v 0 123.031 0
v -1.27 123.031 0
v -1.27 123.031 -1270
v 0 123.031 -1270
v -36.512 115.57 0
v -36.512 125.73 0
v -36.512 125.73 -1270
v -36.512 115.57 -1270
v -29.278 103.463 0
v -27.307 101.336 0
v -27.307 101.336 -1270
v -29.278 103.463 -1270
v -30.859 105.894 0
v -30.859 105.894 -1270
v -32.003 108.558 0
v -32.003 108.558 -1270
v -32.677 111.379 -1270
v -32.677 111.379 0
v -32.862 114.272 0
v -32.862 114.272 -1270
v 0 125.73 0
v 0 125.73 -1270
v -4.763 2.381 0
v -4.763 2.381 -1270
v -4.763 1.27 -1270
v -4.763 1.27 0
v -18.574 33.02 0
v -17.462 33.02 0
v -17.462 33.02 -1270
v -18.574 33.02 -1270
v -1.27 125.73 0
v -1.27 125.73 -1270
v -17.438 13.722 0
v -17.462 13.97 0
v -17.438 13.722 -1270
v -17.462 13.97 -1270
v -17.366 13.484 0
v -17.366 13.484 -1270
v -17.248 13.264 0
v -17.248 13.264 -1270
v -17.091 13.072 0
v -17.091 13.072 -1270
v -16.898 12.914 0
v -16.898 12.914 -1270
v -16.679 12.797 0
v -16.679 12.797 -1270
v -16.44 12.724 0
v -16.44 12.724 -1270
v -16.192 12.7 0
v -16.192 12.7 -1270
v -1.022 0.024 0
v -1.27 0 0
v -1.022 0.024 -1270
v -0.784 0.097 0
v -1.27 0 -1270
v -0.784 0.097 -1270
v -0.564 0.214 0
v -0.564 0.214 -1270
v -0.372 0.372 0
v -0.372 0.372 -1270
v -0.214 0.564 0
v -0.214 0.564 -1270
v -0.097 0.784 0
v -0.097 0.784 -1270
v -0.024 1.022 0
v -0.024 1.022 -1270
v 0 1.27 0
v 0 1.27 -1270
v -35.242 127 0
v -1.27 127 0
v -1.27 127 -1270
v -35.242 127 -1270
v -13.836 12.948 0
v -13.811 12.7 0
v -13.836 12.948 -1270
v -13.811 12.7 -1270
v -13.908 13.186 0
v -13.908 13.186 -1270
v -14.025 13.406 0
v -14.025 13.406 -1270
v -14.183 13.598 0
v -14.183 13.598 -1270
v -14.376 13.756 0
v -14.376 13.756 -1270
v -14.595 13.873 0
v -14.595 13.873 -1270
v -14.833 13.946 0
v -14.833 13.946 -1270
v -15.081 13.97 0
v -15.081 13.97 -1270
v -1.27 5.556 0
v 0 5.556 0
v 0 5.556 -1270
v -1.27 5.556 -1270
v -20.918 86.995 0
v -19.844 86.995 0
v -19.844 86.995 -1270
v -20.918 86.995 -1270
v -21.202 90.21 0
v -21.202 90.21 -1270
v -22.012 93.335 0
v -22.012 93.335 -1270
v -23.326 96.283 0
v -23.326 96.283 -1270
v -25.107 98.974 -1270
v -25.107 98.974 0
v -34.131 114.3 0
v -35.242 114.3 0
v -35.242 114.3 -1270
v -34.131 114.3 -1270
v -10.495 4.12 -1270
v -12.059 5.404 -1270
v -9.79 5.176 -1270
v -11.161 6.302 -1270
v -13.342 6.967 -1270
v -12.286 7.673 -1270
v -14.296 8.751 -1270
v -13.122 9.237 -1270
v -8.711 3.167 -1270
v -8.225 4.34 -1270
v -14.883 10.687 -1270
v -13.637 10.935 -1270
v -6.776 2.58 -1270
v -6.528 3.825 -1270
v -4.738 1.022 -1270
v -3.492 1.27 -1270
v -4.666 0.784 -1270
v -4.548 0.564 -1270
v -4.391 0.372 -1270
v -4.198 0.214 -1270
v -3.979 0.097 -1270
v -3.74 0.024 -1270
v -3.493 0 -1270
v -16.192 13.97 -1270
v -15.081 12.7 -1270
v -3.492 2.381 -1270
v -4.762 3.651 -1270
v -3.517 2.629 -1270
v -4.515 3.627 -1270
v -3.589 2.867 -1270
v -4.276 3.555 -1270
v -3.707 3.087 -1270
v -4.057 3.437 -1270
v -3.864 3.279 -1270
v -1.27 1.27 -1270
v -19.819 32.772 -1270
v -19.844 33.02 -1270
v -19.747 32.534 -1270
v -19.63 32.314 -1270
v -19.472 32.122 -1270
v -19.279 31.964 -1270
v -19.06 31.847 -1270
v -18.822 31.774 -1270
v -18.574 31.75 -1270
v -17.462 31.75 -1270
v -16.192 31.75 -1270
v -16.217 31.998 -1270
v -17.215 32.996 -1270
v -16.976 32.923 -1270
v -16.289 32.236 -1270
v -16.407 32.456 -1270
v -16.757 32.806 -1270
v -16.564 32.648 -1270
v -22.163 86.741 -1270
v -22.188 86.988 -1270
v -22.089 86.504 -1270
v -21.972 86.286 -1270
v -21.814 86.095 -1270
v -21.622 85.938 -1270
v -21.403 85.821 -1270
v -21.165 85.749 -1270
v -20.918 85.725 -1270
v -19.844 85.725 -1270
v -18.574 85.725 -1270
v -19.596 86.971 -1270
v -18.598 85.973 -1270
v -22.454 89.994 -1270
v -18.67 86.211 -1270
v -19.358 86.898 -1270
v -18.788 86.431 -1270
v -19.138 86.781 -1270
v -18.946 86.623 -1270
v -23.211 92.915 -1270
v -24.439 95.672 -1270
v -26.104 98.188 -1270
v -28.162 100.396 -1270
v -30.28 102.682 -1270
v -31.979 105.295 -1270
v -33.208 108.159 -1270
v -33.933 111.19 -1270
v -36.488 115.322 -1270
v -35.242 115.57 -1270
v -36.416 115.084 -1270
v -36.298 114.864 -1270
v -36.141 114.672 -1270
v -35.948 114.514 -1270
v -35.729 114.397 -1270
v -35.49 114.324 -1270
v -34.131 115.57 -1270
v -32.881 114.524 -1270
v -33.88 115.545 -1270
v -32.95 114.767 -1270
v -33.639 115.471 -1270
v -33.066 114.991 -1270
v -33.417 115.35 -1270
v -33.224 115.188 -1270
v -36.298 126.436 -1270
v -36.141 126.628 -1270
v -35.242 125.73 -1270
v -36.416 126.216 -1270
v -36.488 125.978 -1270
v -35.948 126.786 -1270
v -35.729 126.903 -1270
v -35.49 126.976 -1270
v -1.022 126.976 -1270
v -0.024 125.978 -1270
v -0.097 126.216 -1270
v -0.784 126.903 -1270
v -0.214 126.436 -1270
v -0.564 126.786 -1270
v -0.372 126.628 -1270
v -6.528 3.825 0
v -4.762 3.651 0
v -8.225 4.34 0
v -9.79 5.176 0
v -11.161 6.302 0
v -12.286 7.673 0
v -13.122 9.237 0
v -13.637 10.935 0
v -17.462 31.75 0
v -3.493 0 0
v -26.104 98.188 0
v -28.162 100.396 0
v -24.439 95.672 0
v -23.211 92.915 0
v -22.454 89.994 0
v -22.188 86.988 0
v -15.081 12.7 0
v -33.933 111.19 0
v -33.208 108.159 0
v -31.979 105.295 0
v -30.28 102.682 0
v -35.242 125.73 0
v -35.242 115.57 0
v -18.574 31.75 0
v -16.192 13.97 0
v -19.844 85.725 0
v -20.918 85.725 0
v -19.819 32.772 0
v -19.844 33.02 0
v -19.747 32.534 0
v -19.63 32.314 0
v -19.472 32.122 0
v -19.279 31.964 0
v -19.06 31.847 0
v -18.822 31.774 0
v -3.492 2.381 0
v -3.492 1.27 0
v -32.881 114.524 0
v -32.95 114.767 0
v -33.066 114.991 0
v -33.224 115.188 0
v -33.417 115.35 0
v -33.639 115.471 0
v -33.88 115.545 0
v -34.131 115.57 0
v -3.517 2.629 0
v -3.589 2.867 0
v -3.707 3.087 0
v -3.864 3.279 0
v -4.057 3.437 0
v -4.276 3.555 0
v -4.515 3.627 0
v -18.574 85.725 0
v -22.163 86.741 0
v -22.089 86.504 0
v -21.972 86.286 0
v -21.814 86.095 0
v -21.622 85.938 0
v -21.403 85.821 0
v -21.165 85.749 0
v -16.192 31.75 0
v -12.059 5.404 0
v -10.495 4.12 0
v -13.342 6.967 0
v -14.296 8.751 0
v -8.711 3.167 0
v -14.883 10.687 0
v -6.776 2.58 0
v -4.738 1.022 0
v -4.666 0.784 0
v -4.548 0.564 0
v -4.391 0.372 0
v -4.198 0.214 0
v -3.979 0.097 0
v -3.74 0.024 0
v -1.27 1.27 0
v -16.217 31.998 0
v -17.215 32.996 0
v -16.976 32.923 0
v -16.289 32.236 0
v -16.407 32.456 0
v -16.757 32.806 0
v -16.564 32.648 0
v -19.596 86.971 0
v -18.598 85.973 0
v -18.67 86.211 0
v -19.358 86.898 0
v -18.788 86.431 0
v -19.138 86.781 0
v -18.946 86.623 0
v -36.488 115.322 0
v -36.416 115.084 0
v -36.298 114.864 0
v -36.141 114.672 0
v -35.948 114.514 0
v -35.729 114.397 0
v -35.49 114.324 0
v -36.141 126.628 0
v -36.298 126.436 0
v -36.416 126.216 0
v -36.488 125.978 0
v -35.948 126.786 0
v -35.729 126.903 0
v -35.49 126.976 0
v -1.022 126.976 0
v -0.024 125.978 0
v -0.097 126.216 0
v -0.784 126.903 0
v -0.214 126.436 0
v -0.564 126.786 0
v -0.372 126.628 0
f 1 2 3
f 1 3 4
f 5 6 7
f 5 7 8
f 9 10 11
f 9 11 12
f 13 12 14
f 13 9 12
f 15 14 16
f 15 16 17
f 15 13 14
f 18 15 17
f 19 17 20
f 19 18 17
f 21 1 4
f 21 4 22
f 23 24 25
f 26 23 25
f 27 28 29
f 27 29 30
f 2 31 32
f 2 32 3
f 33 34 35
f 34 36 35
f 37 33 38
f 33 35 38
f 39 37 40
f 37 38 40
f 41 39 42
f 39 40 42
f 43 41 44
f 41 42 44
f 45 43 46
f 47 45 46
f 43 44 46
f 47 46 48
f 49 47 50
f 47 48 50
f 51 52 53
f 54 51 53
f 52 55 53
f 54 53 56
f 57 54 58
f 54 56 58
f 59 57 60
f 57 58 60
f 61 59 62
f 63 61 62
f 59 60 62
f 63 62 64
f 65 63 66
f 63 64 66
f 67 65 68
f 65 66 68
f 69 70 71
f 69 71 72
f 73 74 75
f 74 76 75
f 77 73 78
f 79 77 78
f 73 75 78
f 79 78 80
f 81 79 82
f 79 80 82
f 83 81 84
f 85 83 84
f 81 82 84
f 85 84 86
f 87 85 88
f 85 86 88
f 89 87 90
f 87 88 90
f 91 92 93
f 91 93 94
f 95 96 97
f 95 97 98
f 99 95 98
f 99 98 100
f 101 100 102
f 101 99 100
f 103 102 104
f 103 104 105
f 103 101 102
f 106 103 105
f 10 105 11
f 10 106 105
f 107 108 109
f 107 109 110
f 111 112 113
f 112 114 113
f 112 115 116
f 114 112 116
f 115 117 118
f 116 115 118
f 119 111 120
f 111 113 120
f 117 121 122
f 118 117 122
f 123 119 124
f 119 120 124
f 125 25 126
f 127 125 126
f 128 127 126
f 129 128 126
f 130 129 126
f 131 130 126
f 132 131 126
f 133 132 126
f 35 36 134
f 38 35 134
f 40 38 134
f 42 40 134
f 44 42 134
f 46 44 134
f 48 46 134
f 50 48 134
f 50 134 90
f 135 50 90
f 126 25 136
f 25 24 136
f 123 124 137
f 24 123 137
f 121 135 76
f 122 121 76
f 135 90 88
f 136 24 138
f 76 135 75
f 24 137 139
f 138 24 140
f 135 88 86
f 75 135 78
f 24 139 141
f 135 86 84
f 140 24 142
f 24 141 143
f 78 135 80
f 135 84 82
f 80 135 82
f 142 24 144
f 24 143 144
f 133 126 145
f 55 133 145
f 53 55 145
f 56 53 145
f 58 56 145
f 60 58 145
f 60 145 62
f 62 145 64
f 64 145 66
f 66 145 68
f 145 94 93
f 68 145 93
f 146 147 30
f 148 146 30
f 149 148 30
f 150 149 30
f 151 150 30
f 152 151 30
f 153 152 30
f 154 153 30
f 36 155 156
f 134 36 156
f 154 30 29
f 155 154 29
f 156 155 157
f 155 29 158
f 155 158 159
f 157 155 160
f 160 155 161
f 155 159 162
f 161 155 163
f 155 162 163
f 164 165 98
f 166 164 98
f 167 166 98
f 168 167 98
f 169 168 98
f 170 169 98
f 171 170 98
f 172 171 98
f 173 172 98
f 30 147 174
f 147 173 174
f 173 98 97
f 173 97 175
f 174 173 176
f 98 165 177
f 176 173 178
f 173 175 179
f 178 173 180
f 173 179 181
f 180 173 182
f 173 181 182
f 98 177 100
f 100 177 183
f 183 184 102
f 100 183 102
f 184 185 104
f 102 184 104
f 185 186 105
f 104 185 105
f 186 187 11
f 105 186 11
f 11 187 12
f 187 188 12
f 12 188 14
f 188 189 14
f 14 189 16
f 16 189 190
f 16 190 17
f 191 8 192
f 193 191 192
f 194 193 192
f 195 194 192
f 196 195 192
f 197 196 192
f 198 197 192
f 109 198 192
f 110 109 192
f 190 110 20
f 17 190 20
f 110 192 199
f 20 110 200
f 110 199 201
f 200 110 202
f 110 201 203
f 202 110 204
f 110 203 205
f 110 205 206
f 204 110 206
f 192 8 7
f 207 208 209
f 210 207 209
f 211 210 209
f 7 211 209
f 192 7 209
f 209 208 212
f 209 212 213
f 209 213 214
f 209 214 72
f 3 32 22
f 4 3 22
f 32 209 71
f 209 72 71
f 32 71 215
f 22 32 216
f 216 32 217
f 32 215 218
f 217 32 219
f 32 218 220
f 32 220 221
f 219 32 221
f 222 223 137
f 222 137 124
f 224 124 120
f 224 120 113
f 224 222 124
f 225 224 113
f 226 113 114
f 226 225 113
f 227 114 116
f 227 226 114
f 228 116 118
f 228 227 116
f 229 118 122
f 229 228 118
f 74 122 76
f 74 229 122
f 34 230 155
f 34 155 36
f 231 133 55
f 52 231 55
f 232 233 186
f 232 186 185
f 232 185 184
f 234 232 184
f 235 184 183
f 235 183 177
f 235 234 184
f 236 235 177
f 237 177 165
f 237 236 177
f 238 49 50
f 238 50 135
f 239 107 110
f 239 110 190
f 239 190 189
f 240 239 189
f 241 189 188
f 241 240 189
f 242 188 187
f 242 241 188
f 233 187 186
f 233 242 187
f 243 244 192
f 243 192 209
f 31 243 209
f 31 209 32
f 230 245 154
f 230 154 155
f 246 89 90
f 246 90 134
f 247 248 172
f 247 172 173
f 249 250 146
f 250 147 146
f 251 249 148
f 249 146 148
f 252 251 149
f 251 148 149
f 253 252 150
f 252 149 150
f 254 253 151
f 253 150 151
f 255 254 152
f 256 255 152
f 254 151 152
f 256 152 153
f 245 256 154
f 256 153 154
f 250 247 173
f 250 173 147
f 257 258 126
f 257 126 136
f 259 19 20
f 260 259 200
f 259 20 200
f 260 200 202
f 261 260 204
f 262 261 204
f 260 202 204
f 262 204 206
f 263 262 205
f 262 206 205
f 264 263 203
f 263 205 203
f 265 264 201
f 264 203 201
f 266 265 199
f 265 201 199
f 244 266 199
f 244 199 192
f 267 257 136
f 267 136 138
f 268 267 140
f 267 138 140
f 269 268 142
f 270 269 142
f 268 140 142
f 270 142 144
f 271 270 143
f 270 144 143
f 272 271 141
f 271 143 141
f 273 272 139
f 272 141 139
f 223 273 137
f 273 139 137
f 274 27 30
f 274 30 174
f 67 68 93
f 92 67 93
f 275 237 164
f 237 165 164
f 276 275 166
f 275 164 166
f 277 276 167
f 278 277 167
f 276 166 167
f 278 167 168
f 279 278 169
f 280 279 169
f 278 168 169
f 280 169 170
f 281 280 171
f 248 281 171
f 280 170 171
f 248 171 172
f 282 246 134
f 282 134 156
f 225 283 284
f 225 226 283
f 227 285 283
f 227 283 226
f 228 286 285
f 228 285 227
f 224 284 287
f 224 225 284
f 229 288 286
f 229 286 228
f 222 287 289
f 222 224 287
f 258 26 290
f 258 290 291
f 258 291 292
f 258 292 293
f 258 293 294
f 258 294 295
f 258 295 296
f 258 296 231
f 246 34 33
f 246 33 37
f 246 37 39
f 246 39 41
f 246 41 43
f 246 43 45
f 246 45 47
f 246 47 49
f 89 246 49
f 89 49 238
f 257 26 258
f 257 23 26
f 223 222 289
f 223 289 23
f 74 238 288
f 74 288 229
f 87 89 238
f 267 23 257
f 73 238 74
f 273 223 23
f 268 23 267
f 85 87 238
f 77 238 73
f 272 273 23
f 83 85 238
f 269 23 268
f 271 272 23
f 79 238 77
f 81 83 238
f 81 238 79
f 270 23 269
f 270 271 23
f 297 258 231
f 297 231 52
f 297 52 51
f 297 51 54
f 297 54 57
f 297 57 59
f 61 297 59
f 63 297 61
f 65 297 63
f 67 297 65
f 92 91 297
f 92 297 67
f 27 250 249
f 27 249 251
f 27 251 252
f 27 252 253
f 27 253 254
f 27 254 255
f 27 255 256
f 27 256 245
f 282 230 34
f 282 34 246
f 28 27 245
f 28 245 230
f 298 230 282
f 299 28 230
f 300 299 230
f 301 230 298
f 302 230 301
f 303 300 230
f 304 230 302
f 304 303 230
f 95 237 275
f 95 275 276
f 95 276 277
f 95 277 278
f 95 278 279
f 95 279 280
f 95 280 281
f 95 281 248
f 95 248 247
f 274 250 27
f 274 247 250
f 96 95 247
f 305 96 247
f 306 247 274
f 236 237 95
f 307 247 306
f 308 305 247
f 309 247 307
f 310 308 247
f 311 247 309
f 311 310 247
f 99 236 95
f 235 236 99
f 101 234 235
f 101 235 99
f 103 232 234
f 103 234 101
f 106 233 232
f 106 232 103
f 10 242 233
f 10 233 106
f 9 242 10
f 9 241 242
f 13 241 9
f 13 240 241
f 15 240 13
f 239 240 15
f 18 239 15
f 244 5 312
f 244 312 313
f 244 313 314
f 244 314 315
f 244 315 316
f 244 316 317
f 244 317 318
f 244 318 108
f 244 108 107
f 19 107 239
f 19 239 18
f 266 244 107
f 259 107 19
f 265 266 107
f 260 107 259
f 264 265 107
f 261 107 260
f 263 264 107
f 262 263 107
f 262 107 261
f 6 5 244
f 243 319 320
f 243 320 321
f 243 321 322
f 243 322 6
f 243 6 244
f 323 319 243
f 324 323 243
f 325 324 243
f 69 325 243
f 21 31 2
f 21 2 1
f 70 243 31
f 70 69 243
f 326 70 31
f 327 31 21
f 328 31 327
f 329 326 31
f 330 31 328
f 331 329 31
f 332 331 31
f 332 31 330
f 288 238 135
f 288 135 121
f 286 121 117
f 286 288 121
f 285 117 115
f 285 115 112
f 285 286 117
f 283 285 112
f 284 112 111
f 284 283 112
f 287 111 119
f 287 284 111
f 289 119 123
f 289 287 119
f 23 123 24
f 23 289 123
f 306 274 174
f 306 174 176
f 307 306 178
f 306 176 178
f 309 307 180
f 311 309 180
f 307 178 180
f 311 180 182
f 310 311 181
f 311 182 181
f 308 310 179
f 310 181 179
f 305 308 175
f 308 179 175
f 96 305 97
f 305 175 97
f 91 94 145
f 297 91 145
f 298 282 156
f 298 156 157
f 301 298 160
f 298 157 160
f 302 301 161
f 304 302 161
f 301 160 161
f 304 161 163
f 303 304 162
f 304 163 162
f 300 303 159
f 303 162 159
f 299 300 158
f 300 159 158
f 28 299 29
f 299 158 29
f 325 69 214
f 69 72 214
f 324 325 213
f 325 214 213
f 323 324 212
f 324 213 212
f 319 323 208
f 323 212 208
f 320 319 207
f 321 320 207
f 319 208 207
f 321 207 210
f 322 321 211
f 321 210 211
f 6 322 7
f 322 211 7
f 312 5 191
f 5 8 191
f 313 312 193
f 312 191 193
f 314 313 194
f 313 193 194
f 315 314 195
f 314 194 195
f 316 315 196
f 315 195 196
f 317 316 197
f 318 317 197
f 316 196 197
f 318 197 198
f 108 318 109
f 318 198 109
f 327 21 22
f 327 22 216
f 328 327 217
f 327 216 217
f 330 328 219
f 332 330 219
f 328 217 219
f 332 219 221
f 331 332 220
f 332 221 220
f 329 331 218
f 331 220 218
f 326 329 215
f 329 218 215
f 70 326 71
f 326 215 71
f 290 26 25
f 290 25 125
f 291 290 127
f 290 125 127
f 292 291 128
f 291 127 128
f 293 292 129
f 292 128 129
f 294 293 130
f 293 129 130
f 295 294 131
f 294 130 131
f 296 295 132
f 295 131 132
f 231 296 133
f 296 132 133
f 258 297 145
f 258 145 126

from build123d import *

# Parameters (mm, degrees)
EXTRUDE_THIN1_DEPTH = 1270
FILLET1_R           = 1.27


with BuildPart() as part:
    # Sketch1 → Extrude-Thin1 (new body)
    with BuildSketch(Plane.XY):
        with BuildLine():
            Line((0, 123.03125), (0, 127))
            Line((0, 127), (-36.5125, 127))
            Line((-36.5125, 127), (-36.5125, 114.3))
            Line((-36.5125, 114.3), (-34.13125, 114.3))
            ThreePointArc((-34.13125, 114.3), (-32.654718449, 106.700591974), (-28.1616931, 100.396317948))
            ThreePointArc((-28.1616931, 100.396317948), (-23.520818179, 93.737441229), (-22.225, 85.725))
            Line((-22.225, 85.725), (-19.84375, 85.725))
            Line((-19.84375, 85.725), (-19.84375, 31.75))
            Line((-19.84375, 31.75), (-17.4625, 31.75))
            Line((-17.4625, 31.75), (-17.4625, 12.7))
            Line((-17.4625, 12.7), (-15.08125, 12.7))
            ThreePointArc((-15.08125, 12.7), (-12.058958098, 5.403541902), (-4.7625, 2.38125))
            Line((-4.7625, 2.38125), (-4.7625, 0))
            Line((-4.7625, 0), (0, 0))
            Line((0, 0), (0, 5.55625))
            Line((0, 5.55625), (-1.27, 5.55625))
            Line((-1.27, 5.55625), (-1.27, 1.27))
            Line((-1.27, 1.27), (-3.4925, 1.27))
            Line((-3.4925, 1.27), (-3.4925, 3.740816077))
            ThreePointArc((-3.4925, 3.740816077), (-11.160932486, 6.301567514), (-13.721683923, 13.97))
            Line((-13.721683923, 13.97), (-16.1925, 13.97))
            Line((-16.1925, 13.97), (-16.1925, 33.02))
            Line((-16.1925, 33.02), (-18.57375, 33.02))
            Line((-18.57375, 33.02), (-18.57375, 86.995))
            Line((-18.57375, 86.995), (-20.918106783, 86.995))
            ThreePointArc((-20.918106783, 86.995), (-22.60788254, 94.835880545), (-27.307266754, 101.335921917))
            ThreePointArc((-27.307266754, 101.335921917), (-31.732733484, 107.803797872), (-32.783580599, 115.57))
            Line((-32.783580599, 115.57), (-35.2425, 115.57))
            Line((-35.2425, 115.57), (-35.2425, 125.73))
            Line((-35.2425, 125.73), (-1.27, 125.73))
            Line((-1.27, 125.73), (-1.27, 123.03125))
            Line((-1.27, 123.03125), (0, 123.03125))
        make_face()
    extrude(amount=-EXTRUDE_THIN1_DEPTH)

    # Fillet1
    fillet1_edges = [part.edges().sort_by_distance(p)[0] for p in [
        (-32.783580599, 115.57, -635),
        (-18.57375, 86.995, -635),
        (-16.1925, 33.02, -635),
        (-13.721683923, 13.97, -635),
        (-3.4925, 3.740816077, -635),
        (0, 0, -635),
        (-4.7625, 0, -635),
        (-17.4625, 12.7, -635),
        (-19.84375, 31.75, -635),
        (-22.225, 85.725, -635),
        (-36.5125, 114.3, -635),
        (-36.5125, 127, -635),
        (0, 127, -635),
    ]]
    fillet(fillet1_edges, radius=FILLET1_R)


solid = part.part
